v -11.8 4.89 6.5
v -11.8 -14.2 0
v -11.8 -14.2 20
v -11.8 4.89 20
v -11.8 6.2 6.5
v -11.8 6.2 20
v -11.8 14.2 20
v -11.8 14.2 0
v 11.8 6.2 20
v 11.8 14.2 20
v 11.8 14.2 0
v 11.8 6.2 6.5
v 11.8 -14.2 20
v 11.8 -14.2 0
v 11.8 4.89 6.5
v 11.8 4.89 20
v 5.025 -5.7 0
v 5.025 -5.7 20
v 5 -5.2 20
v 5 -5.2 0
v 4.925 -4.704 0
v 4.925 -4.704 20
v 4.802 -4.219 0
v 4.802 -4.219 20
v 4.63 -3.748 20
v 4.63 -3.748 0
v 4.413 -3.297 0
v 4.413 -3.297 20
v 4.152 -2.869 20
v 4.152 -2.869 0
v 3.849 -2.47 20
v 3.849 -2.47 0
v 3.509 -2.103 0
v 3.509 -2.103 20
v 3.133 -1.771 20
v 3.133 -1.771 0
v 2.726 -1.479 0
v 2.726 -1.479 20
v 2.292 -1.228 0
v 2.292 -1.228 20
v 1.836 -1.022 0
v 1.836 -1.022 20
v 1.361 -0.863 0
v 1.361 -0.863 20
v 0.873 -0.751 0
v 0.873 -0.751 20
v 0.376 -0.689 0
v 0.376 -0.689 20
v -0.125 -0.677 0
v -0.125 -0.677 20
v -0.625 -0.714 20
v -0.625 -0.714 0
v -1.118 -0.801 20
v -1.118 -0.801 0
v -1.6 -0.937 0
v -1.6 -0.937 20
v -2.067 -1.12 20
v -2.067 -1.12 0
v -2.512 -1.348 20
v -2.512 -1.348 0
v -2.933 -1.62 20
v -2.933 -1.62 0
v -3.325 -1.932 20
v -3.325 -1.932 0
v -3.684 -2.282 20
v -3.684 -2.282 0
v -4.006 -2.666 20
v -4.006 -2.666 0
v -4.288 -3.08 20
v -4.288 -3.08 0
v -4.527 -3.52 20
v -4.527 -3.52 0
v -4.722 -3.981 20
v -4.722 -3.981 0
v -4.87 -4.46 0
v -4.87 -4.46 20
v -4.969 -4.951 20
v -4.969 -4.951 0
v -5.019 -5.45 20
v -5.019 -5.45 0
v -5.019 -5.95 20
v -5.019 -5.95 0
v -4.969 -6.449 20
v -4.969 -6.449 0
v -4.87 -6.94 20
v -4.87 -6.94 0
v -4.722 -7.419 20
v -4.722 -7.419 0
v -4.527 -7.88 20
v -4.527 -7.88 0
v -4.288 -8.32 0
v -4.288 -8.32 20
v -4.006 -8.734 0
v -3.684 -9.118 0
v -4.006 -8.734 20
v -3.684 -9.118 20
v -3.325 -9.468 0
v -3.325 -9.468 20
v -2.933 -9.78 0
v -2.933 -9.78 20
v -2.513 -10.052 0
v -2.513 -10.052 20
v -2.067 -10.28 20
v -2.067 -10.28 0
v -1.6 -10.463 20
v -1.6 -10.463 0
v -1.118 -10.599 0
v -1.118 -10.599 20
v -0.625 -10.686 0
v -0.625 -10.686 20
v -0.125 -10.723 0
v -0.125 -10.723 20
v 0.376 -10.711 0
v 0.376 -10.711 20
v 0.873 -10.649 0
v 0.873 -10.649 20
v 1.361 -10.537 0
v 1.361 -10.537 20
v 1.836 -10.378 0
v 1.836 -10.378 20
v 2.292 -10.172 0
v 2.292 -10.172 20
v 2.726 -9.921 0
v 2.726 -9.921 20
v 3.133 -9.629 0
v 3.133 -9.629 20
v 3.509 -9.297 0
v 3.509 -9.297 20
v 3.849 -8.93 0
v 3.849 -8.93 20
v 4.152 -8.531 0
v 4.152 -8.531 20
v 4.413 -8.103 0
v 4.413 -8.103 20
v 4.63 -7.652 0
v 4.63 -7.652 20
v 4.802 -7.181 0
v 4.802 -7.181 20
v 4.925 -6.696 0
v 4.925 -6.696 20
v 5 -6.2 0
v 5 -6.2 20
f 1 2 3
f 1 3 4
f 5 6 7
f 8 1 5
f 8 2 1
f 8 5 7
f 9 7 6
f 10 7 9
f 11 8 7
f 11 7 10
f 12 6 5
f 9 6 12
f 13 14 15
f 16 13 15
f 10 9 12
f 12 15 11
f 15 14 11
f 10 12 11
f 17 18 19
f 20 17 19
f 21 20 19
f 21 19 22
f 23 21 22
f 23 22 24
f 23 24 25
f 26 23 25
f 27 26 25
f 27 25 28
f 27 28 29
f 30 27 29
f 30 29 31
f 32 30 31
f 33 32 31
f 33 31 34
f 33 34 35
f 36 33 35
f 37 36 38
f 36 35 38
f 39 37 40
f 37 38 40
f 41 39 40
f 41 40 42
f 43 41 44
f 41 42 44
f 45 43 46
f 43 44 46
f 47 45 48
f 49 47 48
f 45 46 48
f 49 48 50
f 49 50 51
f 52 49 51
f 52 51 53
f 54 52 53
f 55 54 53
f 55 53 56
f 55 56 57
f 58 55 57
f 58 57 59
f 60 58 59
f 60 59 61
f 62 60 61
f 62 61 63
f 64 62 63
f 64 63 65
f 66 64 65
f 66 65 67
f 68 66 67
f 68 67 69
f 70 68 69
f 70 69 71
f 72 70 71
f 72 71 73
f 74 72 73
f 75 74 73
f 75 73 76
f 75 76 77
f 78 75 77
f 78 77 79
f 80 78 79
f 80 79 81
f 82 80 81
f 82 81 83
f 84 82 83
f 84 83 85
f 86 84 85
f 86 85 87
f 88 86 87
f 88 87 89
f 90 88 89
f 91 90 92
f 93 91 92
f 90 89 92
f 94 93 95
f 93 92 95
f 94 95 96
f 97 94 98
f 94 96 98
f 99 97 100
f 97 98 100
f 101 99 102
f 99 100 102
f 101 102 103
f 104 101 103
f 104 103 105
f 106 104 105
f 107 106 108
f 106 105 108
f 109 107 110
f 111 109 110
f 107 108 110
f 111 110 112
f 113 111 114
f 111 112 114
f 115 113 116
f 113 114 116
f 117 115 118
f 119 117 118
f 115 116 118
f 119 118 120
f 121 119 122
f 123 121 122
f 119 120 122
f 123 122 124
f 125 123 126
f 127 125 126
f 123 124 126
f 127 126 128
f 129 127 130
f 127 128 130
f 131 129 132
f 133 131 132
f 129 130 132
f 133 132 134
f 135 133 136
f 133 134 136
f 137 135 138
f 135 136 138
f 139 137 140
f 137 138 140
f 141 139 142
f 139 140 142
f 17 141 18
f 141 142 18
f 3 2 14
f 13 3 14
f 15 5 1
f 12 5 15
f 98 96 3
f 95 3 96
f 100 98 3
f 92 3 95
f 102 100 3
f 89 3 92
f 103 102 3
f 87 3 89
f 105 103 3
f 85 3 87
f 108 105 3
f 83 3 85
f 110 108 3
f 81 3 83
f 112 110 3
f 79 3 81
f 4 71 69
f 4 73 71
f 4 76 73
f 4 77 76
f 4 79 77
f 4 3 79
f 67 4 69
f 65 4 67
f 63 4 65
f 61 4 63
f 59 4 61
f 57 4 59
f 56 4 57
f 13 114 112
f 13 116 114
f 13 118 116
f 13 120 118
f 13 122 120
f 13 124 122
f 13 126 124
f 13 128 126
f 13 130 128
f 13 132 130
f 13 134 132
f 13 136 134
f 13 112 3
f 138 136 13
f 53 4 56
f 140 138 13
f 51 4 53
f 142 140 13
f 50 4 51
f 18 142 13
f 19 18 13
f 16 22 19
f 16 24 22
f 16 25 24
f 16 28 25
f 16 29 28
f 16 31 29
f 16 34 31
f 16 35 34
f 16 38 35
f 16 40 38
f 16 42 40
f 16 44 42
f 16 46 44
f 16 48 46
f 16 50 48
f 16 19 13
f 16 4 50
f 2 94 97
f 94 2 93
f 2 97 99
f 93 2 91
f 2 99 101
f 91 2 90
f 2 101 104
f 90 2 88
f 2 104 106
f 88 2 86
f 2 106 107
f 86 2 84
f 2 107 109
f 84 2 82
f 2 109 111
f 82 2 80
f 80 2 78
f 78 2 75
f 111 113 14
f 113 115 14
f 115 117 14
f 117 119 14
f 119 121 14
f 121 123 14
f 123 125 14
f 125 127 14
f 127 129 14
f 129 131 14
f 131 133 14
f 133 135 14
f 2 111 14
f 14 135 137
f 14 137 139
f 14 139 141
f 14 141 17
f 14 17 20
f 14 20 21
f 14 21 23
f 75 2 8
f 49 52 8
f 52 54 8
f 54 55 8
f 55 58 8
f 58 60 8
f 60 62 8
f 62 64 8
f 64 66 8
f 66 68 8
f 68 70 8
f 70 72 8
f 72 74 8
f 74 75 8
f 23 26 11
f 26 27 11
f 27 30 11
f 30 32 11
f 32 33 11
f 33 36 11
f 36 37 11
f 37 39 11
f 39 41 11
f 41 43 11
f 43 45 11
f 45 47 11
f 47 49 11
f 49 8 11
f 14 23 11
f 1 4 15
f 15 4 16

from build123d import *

# Parameters (mm, degrees)
F0_W     = 23.6
F0_H     = 28.4
F1_DEPTH = 20
F2_W     = 23.6
F2_H     = 1.31
F3_DEPTH = 13.5
F2_R     = 5.025
F4_DEPTH = 20.001


with BuildPart() as f1:
    # F0 (on Top) → F1 (new body)
    with BuildSketch(Plane.XY):
        Rectangle(F0_W, F0_H)
    extrude(amount=F1_DEPTH)

    # F2 (on face) → F3 (cut)
    with BuildSketch(Plane.XY.offset(20)):
        with Locations((0, 5.545)):
            Rectangle(F2_W, F2_H)
    extrude(amount=-F3_DEPTH, mode=Mode.SUBTRACT)

    # F2 (on face) → F4 (cut, through all)
    with BuildSketch(Plane.XY.offset(20)):
        with Locations((0, -5.7)):
            Circle(F2_R)
    extrude(amount=-F4_DEPTH, mode=Mode.SUBTRACT)


solid = f1.part
